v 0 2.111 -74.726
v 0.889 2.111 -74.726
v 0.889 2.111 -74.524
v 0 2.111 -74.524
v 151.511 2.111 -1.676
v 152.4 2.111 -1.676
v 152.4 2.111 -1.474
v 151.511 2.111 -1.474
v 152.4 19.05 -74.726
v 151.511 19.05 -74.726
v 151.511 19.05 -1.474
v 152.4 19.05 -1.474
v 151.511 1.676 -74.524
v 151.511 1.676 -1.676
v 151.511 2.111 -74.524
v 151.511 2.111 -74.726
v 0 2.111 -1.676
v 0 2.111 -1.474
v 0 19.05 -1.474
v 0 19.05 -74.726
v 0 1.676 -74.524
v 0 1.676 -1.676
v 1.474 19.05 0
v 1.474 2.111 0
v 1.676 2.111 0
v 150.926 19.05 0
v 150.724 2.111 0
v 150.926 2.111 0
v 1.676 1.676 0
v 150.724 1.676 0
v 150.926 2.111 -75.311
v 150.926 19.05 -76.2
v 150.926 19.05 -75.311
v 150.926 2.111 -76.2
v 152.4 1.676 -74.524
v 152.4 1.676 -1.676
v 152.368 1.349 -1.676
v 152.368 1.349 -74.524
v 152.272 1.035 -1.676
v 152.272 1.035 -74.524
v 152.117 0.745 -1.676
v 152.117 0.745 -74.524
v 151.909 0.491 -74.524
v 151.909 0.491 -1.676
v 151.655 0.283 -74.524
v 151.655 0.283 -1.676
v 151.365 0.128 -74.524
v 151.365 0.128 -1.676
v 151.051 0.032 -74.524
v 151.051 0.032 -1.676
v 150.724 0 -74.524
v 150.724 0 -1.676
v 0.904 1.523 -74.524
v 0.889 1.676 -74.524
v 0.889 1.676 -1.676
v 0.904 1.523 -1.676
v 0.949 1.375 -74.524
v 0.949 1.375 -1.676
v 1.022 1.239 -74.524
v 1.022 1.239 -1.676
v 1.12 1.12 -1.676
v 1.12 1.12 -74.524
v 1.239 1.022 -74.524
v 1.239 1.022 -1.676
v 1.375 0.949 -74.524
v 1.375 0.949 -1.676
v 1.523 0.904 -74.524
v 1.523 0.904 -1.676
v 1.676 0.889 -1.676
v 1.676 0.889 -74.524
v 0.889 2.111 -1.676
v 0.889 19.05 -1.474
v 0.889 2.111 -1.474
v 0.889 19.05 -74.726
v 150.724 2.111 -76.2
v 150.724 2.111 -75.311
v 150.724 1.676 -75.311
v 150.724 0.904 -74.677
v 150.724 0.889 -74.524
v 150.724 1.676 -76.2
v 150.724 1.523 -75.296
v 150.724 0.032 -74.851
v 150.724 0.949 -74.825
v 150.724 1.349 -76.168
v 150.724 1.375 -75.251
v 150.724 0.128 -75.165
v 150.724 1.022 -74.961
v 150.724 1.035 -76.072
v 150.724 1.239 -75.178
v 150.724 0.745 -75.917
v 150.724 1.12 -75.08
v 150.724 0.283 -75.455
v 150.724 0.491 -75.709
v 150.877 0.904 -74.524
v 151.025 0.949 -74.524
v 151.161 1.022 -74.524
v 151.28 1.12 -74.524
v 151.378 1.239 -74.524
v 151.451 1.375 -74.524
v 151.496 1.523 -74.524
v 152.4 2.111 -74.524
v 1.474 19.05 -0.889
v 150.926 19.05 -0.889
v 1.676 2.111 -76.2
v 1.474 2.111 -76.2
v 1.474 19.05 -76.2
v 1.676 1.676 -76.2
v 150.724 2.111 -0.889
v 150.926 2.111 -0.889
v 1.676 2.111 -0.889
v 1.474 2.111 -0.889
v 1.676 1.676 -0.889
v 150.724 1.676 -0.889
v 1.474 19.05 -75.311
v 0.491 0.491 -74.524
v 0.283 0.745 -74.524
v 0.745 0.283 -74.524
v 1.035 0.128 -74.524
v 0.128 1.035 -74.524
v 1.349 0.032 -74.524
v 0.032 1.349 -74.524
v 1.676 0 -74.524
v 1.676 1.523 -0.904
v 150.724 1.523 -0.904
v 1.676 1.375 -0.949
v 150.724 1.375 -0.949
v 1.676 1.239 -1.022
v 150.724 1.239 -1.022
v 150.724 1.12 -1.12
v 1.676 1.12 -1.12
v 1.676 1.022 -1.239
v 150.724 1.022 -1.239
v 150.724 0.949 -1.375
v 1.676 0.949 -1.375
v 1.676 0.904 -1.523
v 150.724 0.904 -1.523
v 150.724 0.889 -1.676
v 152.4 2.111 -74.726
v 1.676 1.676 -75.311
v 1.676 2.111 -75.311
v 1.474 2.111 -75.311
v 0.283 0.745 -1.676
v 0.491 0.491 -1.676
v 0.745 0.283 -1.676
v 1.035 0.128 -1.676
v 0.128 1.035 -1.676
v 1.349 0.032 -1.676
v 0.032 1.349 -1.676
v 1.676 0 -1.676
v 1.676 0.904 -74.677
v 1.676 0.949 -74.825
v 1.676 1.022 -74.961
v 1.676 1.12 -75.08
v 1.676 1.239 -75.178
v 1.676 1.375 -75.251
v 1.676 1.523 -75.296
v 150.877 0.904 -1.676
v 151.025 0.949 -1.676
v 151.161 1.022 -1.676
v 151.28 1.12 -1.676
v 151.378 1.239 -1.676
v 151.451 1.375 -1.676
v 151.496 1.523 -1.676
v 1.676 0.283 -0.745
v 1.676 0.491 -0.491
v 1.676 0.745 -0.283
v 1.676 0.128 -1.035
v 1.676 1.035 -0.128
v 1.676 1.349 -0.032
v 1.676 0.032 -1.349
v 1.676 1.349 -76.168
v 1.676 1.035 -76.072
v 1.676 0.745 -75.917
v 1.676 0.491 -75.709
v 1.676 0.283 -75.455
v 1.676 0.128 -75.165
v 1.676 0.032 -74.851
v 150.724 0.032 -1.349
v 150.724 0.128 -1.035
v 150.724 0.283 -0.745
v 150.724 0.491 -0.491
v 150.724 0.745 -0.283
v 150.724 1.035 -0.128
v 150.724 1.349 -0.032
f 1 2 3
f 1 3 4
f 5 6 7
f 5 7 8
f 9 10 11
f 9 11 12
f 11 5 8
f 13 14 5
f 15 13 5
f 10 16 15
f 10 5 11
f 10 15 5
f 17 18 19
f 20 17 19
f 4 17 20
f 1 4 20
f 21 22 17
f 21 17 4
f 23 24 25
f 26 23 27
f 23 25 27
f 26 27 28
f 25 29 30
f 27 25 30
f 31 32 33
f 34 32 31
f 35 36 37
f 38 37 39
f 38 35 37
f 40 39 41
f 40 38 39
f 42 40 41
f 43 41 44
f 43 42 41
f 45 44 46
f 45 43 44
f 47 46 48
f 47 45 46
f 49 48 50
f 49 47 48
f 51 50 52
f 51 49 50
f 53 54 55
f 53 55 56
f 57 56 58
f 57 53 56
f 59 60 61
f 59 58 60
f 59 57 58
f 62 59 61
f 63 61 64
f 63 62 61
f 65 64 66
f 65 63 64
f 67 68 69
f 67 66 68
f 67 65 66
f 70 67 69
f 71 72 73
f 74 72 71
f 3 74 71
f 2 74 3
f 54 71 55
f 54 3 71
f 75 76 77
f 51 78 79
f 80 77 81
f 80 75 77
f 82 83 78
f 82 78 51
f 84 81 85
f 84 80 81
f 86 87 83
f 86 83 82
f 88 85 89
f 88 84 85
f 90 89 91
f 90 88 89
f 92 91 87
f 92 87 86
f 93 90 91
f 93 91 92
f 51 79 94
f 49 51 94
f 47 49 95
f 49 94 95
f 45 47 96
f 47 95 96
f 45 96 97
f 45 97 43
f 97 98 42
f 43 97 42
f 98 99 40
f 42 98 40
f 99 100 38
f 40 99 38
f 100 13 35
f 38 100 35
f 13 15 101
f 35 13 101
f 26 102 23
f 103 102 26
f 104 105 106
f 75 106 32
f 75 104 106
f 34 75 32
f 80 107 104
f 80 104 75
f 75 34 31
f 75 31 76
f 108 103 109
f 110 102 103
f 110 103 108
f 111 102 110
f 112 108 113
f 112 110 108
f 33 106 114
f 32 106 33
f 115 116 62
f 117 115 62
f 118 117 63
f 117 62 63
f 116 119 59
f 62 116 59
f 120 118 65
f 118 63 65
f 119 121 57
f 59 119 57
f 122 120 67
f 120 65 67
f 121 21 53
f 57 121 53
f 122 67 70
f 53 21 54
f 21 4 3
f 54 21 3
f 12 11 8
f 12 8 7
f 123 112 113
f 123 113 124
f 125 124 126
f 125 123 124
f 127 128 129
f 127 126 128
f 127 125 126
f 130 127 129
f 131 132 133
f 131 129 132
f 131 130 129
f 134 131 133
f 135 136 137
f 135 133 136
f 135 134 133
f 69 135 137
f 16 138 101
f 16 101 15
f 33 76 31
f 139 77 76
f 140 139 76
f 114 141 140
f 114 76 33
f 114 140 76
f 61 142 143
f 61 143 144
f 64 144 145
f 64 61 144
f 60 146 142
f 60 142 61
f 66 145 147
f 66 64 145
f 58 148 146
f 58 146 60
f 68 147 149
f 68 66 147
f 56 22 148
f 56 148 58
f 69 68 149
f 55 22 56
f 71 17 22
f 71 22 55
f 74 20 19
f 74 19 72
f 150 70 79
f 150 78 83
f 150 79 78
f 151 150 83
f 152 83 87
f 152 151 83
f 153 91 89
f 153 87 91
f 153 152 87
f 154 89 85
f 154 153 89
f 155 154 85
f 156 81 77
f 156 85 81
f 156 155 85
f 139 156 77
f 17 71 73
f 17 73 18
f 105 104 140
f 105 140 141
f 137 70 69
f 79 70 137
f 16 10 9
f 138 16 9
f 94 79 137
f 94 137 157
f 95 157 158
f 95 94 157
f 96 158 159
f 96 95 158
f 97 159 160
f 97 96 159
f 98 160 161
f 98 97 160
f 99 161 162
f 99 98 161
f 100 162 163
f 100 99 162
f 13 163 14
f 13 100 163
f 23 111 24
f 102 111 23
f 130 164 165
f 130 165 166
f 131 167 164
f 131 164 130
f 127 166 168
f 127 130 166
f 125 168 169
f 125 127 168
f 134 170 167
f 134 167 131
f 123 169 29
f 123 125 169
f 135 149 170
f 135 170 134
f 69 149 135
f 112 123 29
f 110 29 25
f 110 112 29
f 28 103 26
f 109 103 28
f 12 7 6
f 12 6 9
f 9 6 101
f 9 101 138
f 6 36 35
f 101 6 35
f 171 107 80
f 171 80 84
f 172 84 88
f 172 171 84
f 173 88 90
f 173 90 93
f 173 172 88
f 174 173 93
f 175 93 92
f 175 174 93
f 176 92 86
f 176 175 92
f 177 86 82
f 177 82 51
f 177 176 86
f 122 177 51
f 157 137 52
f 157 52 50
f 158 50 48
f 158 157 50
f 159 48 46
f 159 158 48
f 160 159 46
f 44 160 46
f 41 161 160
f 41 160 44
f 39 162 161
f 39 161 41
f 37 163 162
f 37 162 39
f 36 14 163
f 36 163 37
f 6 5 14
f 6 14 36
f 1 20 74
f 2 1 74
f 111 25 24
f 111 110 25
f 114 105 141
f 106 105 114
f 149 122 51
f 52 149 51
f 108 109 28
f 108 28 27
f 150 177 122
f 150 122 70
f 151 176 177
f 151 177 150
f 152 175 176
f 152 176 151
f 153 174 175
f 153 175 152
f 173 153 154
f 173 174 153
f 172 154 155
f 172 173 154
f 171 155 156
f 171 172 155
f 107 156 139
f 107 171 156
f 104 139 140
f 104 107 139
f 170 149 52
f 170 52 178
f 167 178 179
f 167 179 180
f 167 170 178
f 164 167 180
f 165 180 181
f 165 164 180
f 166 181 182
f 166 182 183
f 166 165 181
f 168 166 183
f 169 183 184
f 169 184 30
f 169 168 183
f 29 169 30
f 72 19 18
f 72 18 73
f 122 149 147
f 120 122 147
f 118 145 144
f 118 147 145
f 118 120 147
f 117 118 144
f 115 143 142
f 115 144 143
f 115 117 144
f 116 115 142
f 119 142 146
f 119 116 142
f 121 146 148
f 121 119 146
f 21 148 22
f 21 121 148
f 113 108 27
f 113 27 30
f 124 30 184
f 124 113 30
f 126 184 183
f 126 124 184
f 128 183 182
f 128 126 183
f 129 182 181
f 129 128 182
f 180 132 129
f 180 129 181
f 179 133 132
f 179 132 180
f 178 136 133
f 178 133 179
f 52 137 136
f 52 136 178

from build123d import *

# Parameters (mm, degrees)
SKETCH1_W              = 152.4
SKETCH1_H              = 76.2
BOSS_EXTRUDE1_DEPTH    = 19.05
CONVERT_SOLID1_START   = -74.5236
CONVERT_SOLID1_DEPTH   = 72.8472
CONVERT_SOLID1_START_2 = -77
CONVERT_SOLID1_2_DEPTH = 2.273736392
CONVERT_SOLID1_START_3 = -1.473736392
CONVERT_SOLID1_3_DEPTH = 2.473736392
CONVERT_SOLID1_START_4 = -74.726263608
CONVERT_SOLID1_4_DEPTH = 73.252527216
CONVERT_SOLID1_5_DEPTH = 0.202663608
CONVERT_SOLID1_START_5 = -1.6764
CONVERT_SOLID1_6_DEPTH = 0.202663608
CONVERT_SOLID1_START_6 = 1.473736392
CONVERT_SOLID1_7_DEPTH = 149.452527216


with BuildPart() as part:
    # Sketch1 → Boss-Extrude1 (new body)
    with BuildSketch(Plane(origin=(0, 0, 0), x_dir=(1, 0, 0), z_dir=(0, 1, 0))):
        with Locations((76.2, 38.1)):
            Rectangle(SKETCH1_W, SKETCH1_H)
    extrude(amount=BOSS_EXTRUDE1_DEPTH)

    # Convert-Solid1: read off the stored shape, not the designer's step
    # Convert-Solid1 outline → Convert-Solid1 (cut)
    with BuildSketch(Plane.XY.offset(CONVERT_SOLID1_START)):
        with BuildLine():
            Line((151.511, 19.05), (0.889, 19.05))
            Line((0.889, 19.05), (0.889, 1.6764))
            ThreePointArc((0.889, 1.6764), (1.11962412, 1.11962412), (1.6764, 0.889))
            Line((1.6764, 0.889), (150.7236, 0.889))
            ThreePointArc((150.7236, 0.889), (151.28037588, 1.11962412), (151.511, 1.6764))
            Line((151.511, 1.6764), (151.511, 19.05))
        make_face()
        with BuildLine():
            ThreePointArc((152.4, 1.6764), (151.908993808, 0.491006192), (150.7236, 0))
            Line((150.7236, 0), (152.4, 0))
            Line((152.4, 0), (152.4, 1.6764))
        make_face()
        with BuildLine():
            Line((0, 0), (1.6764, 0))
            ThreePointArc((1.6764, 0), (0.491006192, 0.491006192), (0, 1.6764))
            Line((0, 1.6764), (0, 0))
        make_face()
    extrude(amount=CONVERT_SOLID1_DEPTH, mode=Mode.SUBTRACT)

    # Convert-Solid1 2 outline → Convert-Solid1 2 (cut)
    with BuildSketch(Plane.XY.offset(CONVERT_SOLID1_START_2)):
        Polygon((150.926263608, 2.11106664), (150.7236, 2.11106664), (150.7236, 0), (152.4, 0), (152.4, 19.05), (150.926263608, 19.05), align=None)
        Polygon((1.473736392, 19.05), (0, 19.05), (0, 0), (1.6764, 0), (1.6764, 2.11106664), (1.473736392, 2.11106664), align=None)
    extrude(amount=CONVERT_SOLID1_2_DEPTH, mode=Mode.SUBTRACT)

    # Convert-Solid1 3 outline → Convert-Solid1 3 (cut)
    with BuildSketch(Plane.XY.offset(CONVERT_SOLID1_START_3)):
        Polygon((150.926263608, 2.11106664), (150.7236, 2.11106664), (150.7236, 0), (152.4, 0), (152.4, 19.05), (150.926263608, 19.05), align=None)
        Polygon((1.473736392, 19.05), (0, 19.05), (0, 0), (1.6764, 0), (1.6764, 2.11106664), (1.473736392, 2.11106664), align=None)
    extrude(amount=CONVERT_SOLID1_3_DEPTH, mode=Mode.SUBTRACT)

    # Convert-Solid1 4 outline → Convert-Solid1 4 (cut)
    with BuildSketch(Plane.XY.offset(CONVERT_SOLID1_START_4)):
        with BuildLine():
            Line((150.926263608, 2.11106664), (150.7236, 2.11106664))
            Line((150.7236, 2.11106664), (150.7236, 0.889))
            ThreePointArc((150.7236, 0.889), (151.28037588, 1.11962412), (151.511, 1.6764))
            Line((151.511, 1.6764), (151.511, 19.05))
            Line((151.511, 19.05), (150.926263608, 19.05))
            Line((150.926263608, 19.05), (150.926263608, 2.11106664))
        make_face()
        with BuildLine():
            ThreePointArc((152.4, 1.6764), (151.908993808, 0.491006192), (150.7236, 0))
            Line((150.7236, 0), (152.4, 0))
            Line((152.4, 0), (152.4, 1.6764))
        make_face()
        with BuildLine():
            ThreePointArc((0.889, 1.6764), (1.11962412, 1.11962412), (1.6764, 0.889))
            Line((1.6764, 0.889), (1.6764, 2.11106664))
            Line((1.6764, 2.11106664), (1.473736392, 2.11106664))
            Line((1.473736392, 2.11106664), (1.473736392, 19.05))
            Line((1.473736392, 19.05), (0.889, 19.05))
            Line((0.889, 19.05), (0.889, 1.6764))
        make_face()
        with BuildLine():
            Line((0, 0), (1.6764, 0))
            ThreePointArc((1.6764, 0), (0.491006192, 0.491006192), (0, 1.6764))
            Line((0, 1.6764), (0, 0))
        make_face()
    extrude(amount=CONVERT_SOLID1_4_DEPTH, mode=Mode.SUBTRACT)

    # Convert-Solid1 5 outline → Convert-Solid1 5 (cut)
    with BuildSketch(Plane.XY.offset(CONVERT_SOLID1_START_4)):
        with BuildLine():
            ThreePointArc((151.511, 1.6764), (151.28037588, 1.11962412), (150.7236, 0.889))
            Line((150.7236, 0.889), (150.7236, 0))
            ThreePointArc((150.7236, 0), (151.908993808, 0.491006192), (152.4, 1.6764))
            Line((152.4, 1.6764), (152.4, 2.11106664))
            Line((152.4, 2.11106664), (151.511, 2.11106664))
            Line((151.511, 2.11106664), (151.511, 1.6764))
        make_face()
        with BuildLine():
            Line((1.6764, 0), (1.6764, 0.889))
            ThreePointArc((1.6764, 0.889), (1.11962412, 1.11962412), (0.889, 1.6764))
            Line((0.889, 1.6764), (0.889, 2.11106664))
            Line((0.889, 2.11106664), (0, 2.11106664))
            Line((0, 2.11106664), (0, 1.6764))
            ThreePointArc((0, 1.6764), (0.491006192, 0.491006192), (1.6764, 0))
        make_face()
    extrude(amount=CONVERT_SOLID1_5_DEPTH, mode=Mode.SUBTRACT)

    # Convert-Solid1 6 outline → Convert-Solid1 6 (cut)
    with BuildSketch(Plane.XY.offset(CONVERT_SOLID1_START_5)):
        with BuildLine():
            ThreePointArc((151.511, 1.6764), (151.28037588, 1.11962412), (150.7236, 0.889))
            Line((150.7236, 0.889), (150.7236, 0))
            ThreePointArc((150.7236, 0), (151.908993808, 0.491006192), (152.4, 1.6764))
            Line((152.4, 1.6764), (152.4, 2.11106664))
            Line((152.4, 2.11106664), (151.511, 2.11106664))
            Line((151.511, 2.11106664), (151.511, 1.6764))
        make_face()
        with BuildLine():
            Line((1.6764, 0), (1.6764, 0.889))
            ThreePointArc((1.6764, 0.889), (1.11962412, 1.11962412), (0.889, 1.6764))
            Line((0.889, 1.6764), (0.889, 2.11106664))
            Line((0.889, 2.11106664), (0, 2.11106664))
            Line((0, 2.11106664), (0, 1.6764))
            ThreePointArc((0, 1.6764), (0.491006192, 0.491006192), (1.6764, 0))
        make_face()
    extrude(amount=CONVERT_SOLID1_6_DEPTH, mode=Mode.SUBTRACT)

    # Convert-Solid1 7 outline → Convert-Solid1 7 (cut)
    with BuildSketch(Plane.YZ.offset(CONVERT_SOLID1_START_6)):
        with BuildLine():
            Line((0, 0), (0, -1.6764))
            ThreePointArc((0, -1.6764), (0.491006192, -0.491006192), (1.6764, 0))
            Line((1.6764, 0), (0, 0))
        make_face()
        with BuildLine():
            ThreePointArc((1.6764, -76.2), (0.491006192, -75.708993808), (0, -74.5236))
            Line((0, -74.5236), (0, -76.2))
            Line((0, -76.2), (1.6764, -76.2))
        make_face()
        with BuildLine():
            Line((19.05, -74.5236), (0.889, -74.5236))
            ThreePointArc((0.889, -74.5236), (1.11962412, -75.08037588), (1.6764, -75.311))
            Line((1.6764, -75.311), (19.05, -75.311))
            Line((19.05, -75.311), (19.05, -74.5236))
        make_face()
        with BuildLine():
            Line((0.889, -1.6764), (19.05, -1.6764))
            Line((19.05, -1.6764), (19.05, -0.889))
            Line((19.05, -0.889), (1.6764, -0.889))
            ThreePointArc((1.6764, -0.889), (1.11962412, -1.11962412), (0.889, -1.6764))
        make_face()
    extrude(amount=CONVERT_SOLID1_7_DEPTH, mode=Mode.SUBTRACT)


solid = part.part
